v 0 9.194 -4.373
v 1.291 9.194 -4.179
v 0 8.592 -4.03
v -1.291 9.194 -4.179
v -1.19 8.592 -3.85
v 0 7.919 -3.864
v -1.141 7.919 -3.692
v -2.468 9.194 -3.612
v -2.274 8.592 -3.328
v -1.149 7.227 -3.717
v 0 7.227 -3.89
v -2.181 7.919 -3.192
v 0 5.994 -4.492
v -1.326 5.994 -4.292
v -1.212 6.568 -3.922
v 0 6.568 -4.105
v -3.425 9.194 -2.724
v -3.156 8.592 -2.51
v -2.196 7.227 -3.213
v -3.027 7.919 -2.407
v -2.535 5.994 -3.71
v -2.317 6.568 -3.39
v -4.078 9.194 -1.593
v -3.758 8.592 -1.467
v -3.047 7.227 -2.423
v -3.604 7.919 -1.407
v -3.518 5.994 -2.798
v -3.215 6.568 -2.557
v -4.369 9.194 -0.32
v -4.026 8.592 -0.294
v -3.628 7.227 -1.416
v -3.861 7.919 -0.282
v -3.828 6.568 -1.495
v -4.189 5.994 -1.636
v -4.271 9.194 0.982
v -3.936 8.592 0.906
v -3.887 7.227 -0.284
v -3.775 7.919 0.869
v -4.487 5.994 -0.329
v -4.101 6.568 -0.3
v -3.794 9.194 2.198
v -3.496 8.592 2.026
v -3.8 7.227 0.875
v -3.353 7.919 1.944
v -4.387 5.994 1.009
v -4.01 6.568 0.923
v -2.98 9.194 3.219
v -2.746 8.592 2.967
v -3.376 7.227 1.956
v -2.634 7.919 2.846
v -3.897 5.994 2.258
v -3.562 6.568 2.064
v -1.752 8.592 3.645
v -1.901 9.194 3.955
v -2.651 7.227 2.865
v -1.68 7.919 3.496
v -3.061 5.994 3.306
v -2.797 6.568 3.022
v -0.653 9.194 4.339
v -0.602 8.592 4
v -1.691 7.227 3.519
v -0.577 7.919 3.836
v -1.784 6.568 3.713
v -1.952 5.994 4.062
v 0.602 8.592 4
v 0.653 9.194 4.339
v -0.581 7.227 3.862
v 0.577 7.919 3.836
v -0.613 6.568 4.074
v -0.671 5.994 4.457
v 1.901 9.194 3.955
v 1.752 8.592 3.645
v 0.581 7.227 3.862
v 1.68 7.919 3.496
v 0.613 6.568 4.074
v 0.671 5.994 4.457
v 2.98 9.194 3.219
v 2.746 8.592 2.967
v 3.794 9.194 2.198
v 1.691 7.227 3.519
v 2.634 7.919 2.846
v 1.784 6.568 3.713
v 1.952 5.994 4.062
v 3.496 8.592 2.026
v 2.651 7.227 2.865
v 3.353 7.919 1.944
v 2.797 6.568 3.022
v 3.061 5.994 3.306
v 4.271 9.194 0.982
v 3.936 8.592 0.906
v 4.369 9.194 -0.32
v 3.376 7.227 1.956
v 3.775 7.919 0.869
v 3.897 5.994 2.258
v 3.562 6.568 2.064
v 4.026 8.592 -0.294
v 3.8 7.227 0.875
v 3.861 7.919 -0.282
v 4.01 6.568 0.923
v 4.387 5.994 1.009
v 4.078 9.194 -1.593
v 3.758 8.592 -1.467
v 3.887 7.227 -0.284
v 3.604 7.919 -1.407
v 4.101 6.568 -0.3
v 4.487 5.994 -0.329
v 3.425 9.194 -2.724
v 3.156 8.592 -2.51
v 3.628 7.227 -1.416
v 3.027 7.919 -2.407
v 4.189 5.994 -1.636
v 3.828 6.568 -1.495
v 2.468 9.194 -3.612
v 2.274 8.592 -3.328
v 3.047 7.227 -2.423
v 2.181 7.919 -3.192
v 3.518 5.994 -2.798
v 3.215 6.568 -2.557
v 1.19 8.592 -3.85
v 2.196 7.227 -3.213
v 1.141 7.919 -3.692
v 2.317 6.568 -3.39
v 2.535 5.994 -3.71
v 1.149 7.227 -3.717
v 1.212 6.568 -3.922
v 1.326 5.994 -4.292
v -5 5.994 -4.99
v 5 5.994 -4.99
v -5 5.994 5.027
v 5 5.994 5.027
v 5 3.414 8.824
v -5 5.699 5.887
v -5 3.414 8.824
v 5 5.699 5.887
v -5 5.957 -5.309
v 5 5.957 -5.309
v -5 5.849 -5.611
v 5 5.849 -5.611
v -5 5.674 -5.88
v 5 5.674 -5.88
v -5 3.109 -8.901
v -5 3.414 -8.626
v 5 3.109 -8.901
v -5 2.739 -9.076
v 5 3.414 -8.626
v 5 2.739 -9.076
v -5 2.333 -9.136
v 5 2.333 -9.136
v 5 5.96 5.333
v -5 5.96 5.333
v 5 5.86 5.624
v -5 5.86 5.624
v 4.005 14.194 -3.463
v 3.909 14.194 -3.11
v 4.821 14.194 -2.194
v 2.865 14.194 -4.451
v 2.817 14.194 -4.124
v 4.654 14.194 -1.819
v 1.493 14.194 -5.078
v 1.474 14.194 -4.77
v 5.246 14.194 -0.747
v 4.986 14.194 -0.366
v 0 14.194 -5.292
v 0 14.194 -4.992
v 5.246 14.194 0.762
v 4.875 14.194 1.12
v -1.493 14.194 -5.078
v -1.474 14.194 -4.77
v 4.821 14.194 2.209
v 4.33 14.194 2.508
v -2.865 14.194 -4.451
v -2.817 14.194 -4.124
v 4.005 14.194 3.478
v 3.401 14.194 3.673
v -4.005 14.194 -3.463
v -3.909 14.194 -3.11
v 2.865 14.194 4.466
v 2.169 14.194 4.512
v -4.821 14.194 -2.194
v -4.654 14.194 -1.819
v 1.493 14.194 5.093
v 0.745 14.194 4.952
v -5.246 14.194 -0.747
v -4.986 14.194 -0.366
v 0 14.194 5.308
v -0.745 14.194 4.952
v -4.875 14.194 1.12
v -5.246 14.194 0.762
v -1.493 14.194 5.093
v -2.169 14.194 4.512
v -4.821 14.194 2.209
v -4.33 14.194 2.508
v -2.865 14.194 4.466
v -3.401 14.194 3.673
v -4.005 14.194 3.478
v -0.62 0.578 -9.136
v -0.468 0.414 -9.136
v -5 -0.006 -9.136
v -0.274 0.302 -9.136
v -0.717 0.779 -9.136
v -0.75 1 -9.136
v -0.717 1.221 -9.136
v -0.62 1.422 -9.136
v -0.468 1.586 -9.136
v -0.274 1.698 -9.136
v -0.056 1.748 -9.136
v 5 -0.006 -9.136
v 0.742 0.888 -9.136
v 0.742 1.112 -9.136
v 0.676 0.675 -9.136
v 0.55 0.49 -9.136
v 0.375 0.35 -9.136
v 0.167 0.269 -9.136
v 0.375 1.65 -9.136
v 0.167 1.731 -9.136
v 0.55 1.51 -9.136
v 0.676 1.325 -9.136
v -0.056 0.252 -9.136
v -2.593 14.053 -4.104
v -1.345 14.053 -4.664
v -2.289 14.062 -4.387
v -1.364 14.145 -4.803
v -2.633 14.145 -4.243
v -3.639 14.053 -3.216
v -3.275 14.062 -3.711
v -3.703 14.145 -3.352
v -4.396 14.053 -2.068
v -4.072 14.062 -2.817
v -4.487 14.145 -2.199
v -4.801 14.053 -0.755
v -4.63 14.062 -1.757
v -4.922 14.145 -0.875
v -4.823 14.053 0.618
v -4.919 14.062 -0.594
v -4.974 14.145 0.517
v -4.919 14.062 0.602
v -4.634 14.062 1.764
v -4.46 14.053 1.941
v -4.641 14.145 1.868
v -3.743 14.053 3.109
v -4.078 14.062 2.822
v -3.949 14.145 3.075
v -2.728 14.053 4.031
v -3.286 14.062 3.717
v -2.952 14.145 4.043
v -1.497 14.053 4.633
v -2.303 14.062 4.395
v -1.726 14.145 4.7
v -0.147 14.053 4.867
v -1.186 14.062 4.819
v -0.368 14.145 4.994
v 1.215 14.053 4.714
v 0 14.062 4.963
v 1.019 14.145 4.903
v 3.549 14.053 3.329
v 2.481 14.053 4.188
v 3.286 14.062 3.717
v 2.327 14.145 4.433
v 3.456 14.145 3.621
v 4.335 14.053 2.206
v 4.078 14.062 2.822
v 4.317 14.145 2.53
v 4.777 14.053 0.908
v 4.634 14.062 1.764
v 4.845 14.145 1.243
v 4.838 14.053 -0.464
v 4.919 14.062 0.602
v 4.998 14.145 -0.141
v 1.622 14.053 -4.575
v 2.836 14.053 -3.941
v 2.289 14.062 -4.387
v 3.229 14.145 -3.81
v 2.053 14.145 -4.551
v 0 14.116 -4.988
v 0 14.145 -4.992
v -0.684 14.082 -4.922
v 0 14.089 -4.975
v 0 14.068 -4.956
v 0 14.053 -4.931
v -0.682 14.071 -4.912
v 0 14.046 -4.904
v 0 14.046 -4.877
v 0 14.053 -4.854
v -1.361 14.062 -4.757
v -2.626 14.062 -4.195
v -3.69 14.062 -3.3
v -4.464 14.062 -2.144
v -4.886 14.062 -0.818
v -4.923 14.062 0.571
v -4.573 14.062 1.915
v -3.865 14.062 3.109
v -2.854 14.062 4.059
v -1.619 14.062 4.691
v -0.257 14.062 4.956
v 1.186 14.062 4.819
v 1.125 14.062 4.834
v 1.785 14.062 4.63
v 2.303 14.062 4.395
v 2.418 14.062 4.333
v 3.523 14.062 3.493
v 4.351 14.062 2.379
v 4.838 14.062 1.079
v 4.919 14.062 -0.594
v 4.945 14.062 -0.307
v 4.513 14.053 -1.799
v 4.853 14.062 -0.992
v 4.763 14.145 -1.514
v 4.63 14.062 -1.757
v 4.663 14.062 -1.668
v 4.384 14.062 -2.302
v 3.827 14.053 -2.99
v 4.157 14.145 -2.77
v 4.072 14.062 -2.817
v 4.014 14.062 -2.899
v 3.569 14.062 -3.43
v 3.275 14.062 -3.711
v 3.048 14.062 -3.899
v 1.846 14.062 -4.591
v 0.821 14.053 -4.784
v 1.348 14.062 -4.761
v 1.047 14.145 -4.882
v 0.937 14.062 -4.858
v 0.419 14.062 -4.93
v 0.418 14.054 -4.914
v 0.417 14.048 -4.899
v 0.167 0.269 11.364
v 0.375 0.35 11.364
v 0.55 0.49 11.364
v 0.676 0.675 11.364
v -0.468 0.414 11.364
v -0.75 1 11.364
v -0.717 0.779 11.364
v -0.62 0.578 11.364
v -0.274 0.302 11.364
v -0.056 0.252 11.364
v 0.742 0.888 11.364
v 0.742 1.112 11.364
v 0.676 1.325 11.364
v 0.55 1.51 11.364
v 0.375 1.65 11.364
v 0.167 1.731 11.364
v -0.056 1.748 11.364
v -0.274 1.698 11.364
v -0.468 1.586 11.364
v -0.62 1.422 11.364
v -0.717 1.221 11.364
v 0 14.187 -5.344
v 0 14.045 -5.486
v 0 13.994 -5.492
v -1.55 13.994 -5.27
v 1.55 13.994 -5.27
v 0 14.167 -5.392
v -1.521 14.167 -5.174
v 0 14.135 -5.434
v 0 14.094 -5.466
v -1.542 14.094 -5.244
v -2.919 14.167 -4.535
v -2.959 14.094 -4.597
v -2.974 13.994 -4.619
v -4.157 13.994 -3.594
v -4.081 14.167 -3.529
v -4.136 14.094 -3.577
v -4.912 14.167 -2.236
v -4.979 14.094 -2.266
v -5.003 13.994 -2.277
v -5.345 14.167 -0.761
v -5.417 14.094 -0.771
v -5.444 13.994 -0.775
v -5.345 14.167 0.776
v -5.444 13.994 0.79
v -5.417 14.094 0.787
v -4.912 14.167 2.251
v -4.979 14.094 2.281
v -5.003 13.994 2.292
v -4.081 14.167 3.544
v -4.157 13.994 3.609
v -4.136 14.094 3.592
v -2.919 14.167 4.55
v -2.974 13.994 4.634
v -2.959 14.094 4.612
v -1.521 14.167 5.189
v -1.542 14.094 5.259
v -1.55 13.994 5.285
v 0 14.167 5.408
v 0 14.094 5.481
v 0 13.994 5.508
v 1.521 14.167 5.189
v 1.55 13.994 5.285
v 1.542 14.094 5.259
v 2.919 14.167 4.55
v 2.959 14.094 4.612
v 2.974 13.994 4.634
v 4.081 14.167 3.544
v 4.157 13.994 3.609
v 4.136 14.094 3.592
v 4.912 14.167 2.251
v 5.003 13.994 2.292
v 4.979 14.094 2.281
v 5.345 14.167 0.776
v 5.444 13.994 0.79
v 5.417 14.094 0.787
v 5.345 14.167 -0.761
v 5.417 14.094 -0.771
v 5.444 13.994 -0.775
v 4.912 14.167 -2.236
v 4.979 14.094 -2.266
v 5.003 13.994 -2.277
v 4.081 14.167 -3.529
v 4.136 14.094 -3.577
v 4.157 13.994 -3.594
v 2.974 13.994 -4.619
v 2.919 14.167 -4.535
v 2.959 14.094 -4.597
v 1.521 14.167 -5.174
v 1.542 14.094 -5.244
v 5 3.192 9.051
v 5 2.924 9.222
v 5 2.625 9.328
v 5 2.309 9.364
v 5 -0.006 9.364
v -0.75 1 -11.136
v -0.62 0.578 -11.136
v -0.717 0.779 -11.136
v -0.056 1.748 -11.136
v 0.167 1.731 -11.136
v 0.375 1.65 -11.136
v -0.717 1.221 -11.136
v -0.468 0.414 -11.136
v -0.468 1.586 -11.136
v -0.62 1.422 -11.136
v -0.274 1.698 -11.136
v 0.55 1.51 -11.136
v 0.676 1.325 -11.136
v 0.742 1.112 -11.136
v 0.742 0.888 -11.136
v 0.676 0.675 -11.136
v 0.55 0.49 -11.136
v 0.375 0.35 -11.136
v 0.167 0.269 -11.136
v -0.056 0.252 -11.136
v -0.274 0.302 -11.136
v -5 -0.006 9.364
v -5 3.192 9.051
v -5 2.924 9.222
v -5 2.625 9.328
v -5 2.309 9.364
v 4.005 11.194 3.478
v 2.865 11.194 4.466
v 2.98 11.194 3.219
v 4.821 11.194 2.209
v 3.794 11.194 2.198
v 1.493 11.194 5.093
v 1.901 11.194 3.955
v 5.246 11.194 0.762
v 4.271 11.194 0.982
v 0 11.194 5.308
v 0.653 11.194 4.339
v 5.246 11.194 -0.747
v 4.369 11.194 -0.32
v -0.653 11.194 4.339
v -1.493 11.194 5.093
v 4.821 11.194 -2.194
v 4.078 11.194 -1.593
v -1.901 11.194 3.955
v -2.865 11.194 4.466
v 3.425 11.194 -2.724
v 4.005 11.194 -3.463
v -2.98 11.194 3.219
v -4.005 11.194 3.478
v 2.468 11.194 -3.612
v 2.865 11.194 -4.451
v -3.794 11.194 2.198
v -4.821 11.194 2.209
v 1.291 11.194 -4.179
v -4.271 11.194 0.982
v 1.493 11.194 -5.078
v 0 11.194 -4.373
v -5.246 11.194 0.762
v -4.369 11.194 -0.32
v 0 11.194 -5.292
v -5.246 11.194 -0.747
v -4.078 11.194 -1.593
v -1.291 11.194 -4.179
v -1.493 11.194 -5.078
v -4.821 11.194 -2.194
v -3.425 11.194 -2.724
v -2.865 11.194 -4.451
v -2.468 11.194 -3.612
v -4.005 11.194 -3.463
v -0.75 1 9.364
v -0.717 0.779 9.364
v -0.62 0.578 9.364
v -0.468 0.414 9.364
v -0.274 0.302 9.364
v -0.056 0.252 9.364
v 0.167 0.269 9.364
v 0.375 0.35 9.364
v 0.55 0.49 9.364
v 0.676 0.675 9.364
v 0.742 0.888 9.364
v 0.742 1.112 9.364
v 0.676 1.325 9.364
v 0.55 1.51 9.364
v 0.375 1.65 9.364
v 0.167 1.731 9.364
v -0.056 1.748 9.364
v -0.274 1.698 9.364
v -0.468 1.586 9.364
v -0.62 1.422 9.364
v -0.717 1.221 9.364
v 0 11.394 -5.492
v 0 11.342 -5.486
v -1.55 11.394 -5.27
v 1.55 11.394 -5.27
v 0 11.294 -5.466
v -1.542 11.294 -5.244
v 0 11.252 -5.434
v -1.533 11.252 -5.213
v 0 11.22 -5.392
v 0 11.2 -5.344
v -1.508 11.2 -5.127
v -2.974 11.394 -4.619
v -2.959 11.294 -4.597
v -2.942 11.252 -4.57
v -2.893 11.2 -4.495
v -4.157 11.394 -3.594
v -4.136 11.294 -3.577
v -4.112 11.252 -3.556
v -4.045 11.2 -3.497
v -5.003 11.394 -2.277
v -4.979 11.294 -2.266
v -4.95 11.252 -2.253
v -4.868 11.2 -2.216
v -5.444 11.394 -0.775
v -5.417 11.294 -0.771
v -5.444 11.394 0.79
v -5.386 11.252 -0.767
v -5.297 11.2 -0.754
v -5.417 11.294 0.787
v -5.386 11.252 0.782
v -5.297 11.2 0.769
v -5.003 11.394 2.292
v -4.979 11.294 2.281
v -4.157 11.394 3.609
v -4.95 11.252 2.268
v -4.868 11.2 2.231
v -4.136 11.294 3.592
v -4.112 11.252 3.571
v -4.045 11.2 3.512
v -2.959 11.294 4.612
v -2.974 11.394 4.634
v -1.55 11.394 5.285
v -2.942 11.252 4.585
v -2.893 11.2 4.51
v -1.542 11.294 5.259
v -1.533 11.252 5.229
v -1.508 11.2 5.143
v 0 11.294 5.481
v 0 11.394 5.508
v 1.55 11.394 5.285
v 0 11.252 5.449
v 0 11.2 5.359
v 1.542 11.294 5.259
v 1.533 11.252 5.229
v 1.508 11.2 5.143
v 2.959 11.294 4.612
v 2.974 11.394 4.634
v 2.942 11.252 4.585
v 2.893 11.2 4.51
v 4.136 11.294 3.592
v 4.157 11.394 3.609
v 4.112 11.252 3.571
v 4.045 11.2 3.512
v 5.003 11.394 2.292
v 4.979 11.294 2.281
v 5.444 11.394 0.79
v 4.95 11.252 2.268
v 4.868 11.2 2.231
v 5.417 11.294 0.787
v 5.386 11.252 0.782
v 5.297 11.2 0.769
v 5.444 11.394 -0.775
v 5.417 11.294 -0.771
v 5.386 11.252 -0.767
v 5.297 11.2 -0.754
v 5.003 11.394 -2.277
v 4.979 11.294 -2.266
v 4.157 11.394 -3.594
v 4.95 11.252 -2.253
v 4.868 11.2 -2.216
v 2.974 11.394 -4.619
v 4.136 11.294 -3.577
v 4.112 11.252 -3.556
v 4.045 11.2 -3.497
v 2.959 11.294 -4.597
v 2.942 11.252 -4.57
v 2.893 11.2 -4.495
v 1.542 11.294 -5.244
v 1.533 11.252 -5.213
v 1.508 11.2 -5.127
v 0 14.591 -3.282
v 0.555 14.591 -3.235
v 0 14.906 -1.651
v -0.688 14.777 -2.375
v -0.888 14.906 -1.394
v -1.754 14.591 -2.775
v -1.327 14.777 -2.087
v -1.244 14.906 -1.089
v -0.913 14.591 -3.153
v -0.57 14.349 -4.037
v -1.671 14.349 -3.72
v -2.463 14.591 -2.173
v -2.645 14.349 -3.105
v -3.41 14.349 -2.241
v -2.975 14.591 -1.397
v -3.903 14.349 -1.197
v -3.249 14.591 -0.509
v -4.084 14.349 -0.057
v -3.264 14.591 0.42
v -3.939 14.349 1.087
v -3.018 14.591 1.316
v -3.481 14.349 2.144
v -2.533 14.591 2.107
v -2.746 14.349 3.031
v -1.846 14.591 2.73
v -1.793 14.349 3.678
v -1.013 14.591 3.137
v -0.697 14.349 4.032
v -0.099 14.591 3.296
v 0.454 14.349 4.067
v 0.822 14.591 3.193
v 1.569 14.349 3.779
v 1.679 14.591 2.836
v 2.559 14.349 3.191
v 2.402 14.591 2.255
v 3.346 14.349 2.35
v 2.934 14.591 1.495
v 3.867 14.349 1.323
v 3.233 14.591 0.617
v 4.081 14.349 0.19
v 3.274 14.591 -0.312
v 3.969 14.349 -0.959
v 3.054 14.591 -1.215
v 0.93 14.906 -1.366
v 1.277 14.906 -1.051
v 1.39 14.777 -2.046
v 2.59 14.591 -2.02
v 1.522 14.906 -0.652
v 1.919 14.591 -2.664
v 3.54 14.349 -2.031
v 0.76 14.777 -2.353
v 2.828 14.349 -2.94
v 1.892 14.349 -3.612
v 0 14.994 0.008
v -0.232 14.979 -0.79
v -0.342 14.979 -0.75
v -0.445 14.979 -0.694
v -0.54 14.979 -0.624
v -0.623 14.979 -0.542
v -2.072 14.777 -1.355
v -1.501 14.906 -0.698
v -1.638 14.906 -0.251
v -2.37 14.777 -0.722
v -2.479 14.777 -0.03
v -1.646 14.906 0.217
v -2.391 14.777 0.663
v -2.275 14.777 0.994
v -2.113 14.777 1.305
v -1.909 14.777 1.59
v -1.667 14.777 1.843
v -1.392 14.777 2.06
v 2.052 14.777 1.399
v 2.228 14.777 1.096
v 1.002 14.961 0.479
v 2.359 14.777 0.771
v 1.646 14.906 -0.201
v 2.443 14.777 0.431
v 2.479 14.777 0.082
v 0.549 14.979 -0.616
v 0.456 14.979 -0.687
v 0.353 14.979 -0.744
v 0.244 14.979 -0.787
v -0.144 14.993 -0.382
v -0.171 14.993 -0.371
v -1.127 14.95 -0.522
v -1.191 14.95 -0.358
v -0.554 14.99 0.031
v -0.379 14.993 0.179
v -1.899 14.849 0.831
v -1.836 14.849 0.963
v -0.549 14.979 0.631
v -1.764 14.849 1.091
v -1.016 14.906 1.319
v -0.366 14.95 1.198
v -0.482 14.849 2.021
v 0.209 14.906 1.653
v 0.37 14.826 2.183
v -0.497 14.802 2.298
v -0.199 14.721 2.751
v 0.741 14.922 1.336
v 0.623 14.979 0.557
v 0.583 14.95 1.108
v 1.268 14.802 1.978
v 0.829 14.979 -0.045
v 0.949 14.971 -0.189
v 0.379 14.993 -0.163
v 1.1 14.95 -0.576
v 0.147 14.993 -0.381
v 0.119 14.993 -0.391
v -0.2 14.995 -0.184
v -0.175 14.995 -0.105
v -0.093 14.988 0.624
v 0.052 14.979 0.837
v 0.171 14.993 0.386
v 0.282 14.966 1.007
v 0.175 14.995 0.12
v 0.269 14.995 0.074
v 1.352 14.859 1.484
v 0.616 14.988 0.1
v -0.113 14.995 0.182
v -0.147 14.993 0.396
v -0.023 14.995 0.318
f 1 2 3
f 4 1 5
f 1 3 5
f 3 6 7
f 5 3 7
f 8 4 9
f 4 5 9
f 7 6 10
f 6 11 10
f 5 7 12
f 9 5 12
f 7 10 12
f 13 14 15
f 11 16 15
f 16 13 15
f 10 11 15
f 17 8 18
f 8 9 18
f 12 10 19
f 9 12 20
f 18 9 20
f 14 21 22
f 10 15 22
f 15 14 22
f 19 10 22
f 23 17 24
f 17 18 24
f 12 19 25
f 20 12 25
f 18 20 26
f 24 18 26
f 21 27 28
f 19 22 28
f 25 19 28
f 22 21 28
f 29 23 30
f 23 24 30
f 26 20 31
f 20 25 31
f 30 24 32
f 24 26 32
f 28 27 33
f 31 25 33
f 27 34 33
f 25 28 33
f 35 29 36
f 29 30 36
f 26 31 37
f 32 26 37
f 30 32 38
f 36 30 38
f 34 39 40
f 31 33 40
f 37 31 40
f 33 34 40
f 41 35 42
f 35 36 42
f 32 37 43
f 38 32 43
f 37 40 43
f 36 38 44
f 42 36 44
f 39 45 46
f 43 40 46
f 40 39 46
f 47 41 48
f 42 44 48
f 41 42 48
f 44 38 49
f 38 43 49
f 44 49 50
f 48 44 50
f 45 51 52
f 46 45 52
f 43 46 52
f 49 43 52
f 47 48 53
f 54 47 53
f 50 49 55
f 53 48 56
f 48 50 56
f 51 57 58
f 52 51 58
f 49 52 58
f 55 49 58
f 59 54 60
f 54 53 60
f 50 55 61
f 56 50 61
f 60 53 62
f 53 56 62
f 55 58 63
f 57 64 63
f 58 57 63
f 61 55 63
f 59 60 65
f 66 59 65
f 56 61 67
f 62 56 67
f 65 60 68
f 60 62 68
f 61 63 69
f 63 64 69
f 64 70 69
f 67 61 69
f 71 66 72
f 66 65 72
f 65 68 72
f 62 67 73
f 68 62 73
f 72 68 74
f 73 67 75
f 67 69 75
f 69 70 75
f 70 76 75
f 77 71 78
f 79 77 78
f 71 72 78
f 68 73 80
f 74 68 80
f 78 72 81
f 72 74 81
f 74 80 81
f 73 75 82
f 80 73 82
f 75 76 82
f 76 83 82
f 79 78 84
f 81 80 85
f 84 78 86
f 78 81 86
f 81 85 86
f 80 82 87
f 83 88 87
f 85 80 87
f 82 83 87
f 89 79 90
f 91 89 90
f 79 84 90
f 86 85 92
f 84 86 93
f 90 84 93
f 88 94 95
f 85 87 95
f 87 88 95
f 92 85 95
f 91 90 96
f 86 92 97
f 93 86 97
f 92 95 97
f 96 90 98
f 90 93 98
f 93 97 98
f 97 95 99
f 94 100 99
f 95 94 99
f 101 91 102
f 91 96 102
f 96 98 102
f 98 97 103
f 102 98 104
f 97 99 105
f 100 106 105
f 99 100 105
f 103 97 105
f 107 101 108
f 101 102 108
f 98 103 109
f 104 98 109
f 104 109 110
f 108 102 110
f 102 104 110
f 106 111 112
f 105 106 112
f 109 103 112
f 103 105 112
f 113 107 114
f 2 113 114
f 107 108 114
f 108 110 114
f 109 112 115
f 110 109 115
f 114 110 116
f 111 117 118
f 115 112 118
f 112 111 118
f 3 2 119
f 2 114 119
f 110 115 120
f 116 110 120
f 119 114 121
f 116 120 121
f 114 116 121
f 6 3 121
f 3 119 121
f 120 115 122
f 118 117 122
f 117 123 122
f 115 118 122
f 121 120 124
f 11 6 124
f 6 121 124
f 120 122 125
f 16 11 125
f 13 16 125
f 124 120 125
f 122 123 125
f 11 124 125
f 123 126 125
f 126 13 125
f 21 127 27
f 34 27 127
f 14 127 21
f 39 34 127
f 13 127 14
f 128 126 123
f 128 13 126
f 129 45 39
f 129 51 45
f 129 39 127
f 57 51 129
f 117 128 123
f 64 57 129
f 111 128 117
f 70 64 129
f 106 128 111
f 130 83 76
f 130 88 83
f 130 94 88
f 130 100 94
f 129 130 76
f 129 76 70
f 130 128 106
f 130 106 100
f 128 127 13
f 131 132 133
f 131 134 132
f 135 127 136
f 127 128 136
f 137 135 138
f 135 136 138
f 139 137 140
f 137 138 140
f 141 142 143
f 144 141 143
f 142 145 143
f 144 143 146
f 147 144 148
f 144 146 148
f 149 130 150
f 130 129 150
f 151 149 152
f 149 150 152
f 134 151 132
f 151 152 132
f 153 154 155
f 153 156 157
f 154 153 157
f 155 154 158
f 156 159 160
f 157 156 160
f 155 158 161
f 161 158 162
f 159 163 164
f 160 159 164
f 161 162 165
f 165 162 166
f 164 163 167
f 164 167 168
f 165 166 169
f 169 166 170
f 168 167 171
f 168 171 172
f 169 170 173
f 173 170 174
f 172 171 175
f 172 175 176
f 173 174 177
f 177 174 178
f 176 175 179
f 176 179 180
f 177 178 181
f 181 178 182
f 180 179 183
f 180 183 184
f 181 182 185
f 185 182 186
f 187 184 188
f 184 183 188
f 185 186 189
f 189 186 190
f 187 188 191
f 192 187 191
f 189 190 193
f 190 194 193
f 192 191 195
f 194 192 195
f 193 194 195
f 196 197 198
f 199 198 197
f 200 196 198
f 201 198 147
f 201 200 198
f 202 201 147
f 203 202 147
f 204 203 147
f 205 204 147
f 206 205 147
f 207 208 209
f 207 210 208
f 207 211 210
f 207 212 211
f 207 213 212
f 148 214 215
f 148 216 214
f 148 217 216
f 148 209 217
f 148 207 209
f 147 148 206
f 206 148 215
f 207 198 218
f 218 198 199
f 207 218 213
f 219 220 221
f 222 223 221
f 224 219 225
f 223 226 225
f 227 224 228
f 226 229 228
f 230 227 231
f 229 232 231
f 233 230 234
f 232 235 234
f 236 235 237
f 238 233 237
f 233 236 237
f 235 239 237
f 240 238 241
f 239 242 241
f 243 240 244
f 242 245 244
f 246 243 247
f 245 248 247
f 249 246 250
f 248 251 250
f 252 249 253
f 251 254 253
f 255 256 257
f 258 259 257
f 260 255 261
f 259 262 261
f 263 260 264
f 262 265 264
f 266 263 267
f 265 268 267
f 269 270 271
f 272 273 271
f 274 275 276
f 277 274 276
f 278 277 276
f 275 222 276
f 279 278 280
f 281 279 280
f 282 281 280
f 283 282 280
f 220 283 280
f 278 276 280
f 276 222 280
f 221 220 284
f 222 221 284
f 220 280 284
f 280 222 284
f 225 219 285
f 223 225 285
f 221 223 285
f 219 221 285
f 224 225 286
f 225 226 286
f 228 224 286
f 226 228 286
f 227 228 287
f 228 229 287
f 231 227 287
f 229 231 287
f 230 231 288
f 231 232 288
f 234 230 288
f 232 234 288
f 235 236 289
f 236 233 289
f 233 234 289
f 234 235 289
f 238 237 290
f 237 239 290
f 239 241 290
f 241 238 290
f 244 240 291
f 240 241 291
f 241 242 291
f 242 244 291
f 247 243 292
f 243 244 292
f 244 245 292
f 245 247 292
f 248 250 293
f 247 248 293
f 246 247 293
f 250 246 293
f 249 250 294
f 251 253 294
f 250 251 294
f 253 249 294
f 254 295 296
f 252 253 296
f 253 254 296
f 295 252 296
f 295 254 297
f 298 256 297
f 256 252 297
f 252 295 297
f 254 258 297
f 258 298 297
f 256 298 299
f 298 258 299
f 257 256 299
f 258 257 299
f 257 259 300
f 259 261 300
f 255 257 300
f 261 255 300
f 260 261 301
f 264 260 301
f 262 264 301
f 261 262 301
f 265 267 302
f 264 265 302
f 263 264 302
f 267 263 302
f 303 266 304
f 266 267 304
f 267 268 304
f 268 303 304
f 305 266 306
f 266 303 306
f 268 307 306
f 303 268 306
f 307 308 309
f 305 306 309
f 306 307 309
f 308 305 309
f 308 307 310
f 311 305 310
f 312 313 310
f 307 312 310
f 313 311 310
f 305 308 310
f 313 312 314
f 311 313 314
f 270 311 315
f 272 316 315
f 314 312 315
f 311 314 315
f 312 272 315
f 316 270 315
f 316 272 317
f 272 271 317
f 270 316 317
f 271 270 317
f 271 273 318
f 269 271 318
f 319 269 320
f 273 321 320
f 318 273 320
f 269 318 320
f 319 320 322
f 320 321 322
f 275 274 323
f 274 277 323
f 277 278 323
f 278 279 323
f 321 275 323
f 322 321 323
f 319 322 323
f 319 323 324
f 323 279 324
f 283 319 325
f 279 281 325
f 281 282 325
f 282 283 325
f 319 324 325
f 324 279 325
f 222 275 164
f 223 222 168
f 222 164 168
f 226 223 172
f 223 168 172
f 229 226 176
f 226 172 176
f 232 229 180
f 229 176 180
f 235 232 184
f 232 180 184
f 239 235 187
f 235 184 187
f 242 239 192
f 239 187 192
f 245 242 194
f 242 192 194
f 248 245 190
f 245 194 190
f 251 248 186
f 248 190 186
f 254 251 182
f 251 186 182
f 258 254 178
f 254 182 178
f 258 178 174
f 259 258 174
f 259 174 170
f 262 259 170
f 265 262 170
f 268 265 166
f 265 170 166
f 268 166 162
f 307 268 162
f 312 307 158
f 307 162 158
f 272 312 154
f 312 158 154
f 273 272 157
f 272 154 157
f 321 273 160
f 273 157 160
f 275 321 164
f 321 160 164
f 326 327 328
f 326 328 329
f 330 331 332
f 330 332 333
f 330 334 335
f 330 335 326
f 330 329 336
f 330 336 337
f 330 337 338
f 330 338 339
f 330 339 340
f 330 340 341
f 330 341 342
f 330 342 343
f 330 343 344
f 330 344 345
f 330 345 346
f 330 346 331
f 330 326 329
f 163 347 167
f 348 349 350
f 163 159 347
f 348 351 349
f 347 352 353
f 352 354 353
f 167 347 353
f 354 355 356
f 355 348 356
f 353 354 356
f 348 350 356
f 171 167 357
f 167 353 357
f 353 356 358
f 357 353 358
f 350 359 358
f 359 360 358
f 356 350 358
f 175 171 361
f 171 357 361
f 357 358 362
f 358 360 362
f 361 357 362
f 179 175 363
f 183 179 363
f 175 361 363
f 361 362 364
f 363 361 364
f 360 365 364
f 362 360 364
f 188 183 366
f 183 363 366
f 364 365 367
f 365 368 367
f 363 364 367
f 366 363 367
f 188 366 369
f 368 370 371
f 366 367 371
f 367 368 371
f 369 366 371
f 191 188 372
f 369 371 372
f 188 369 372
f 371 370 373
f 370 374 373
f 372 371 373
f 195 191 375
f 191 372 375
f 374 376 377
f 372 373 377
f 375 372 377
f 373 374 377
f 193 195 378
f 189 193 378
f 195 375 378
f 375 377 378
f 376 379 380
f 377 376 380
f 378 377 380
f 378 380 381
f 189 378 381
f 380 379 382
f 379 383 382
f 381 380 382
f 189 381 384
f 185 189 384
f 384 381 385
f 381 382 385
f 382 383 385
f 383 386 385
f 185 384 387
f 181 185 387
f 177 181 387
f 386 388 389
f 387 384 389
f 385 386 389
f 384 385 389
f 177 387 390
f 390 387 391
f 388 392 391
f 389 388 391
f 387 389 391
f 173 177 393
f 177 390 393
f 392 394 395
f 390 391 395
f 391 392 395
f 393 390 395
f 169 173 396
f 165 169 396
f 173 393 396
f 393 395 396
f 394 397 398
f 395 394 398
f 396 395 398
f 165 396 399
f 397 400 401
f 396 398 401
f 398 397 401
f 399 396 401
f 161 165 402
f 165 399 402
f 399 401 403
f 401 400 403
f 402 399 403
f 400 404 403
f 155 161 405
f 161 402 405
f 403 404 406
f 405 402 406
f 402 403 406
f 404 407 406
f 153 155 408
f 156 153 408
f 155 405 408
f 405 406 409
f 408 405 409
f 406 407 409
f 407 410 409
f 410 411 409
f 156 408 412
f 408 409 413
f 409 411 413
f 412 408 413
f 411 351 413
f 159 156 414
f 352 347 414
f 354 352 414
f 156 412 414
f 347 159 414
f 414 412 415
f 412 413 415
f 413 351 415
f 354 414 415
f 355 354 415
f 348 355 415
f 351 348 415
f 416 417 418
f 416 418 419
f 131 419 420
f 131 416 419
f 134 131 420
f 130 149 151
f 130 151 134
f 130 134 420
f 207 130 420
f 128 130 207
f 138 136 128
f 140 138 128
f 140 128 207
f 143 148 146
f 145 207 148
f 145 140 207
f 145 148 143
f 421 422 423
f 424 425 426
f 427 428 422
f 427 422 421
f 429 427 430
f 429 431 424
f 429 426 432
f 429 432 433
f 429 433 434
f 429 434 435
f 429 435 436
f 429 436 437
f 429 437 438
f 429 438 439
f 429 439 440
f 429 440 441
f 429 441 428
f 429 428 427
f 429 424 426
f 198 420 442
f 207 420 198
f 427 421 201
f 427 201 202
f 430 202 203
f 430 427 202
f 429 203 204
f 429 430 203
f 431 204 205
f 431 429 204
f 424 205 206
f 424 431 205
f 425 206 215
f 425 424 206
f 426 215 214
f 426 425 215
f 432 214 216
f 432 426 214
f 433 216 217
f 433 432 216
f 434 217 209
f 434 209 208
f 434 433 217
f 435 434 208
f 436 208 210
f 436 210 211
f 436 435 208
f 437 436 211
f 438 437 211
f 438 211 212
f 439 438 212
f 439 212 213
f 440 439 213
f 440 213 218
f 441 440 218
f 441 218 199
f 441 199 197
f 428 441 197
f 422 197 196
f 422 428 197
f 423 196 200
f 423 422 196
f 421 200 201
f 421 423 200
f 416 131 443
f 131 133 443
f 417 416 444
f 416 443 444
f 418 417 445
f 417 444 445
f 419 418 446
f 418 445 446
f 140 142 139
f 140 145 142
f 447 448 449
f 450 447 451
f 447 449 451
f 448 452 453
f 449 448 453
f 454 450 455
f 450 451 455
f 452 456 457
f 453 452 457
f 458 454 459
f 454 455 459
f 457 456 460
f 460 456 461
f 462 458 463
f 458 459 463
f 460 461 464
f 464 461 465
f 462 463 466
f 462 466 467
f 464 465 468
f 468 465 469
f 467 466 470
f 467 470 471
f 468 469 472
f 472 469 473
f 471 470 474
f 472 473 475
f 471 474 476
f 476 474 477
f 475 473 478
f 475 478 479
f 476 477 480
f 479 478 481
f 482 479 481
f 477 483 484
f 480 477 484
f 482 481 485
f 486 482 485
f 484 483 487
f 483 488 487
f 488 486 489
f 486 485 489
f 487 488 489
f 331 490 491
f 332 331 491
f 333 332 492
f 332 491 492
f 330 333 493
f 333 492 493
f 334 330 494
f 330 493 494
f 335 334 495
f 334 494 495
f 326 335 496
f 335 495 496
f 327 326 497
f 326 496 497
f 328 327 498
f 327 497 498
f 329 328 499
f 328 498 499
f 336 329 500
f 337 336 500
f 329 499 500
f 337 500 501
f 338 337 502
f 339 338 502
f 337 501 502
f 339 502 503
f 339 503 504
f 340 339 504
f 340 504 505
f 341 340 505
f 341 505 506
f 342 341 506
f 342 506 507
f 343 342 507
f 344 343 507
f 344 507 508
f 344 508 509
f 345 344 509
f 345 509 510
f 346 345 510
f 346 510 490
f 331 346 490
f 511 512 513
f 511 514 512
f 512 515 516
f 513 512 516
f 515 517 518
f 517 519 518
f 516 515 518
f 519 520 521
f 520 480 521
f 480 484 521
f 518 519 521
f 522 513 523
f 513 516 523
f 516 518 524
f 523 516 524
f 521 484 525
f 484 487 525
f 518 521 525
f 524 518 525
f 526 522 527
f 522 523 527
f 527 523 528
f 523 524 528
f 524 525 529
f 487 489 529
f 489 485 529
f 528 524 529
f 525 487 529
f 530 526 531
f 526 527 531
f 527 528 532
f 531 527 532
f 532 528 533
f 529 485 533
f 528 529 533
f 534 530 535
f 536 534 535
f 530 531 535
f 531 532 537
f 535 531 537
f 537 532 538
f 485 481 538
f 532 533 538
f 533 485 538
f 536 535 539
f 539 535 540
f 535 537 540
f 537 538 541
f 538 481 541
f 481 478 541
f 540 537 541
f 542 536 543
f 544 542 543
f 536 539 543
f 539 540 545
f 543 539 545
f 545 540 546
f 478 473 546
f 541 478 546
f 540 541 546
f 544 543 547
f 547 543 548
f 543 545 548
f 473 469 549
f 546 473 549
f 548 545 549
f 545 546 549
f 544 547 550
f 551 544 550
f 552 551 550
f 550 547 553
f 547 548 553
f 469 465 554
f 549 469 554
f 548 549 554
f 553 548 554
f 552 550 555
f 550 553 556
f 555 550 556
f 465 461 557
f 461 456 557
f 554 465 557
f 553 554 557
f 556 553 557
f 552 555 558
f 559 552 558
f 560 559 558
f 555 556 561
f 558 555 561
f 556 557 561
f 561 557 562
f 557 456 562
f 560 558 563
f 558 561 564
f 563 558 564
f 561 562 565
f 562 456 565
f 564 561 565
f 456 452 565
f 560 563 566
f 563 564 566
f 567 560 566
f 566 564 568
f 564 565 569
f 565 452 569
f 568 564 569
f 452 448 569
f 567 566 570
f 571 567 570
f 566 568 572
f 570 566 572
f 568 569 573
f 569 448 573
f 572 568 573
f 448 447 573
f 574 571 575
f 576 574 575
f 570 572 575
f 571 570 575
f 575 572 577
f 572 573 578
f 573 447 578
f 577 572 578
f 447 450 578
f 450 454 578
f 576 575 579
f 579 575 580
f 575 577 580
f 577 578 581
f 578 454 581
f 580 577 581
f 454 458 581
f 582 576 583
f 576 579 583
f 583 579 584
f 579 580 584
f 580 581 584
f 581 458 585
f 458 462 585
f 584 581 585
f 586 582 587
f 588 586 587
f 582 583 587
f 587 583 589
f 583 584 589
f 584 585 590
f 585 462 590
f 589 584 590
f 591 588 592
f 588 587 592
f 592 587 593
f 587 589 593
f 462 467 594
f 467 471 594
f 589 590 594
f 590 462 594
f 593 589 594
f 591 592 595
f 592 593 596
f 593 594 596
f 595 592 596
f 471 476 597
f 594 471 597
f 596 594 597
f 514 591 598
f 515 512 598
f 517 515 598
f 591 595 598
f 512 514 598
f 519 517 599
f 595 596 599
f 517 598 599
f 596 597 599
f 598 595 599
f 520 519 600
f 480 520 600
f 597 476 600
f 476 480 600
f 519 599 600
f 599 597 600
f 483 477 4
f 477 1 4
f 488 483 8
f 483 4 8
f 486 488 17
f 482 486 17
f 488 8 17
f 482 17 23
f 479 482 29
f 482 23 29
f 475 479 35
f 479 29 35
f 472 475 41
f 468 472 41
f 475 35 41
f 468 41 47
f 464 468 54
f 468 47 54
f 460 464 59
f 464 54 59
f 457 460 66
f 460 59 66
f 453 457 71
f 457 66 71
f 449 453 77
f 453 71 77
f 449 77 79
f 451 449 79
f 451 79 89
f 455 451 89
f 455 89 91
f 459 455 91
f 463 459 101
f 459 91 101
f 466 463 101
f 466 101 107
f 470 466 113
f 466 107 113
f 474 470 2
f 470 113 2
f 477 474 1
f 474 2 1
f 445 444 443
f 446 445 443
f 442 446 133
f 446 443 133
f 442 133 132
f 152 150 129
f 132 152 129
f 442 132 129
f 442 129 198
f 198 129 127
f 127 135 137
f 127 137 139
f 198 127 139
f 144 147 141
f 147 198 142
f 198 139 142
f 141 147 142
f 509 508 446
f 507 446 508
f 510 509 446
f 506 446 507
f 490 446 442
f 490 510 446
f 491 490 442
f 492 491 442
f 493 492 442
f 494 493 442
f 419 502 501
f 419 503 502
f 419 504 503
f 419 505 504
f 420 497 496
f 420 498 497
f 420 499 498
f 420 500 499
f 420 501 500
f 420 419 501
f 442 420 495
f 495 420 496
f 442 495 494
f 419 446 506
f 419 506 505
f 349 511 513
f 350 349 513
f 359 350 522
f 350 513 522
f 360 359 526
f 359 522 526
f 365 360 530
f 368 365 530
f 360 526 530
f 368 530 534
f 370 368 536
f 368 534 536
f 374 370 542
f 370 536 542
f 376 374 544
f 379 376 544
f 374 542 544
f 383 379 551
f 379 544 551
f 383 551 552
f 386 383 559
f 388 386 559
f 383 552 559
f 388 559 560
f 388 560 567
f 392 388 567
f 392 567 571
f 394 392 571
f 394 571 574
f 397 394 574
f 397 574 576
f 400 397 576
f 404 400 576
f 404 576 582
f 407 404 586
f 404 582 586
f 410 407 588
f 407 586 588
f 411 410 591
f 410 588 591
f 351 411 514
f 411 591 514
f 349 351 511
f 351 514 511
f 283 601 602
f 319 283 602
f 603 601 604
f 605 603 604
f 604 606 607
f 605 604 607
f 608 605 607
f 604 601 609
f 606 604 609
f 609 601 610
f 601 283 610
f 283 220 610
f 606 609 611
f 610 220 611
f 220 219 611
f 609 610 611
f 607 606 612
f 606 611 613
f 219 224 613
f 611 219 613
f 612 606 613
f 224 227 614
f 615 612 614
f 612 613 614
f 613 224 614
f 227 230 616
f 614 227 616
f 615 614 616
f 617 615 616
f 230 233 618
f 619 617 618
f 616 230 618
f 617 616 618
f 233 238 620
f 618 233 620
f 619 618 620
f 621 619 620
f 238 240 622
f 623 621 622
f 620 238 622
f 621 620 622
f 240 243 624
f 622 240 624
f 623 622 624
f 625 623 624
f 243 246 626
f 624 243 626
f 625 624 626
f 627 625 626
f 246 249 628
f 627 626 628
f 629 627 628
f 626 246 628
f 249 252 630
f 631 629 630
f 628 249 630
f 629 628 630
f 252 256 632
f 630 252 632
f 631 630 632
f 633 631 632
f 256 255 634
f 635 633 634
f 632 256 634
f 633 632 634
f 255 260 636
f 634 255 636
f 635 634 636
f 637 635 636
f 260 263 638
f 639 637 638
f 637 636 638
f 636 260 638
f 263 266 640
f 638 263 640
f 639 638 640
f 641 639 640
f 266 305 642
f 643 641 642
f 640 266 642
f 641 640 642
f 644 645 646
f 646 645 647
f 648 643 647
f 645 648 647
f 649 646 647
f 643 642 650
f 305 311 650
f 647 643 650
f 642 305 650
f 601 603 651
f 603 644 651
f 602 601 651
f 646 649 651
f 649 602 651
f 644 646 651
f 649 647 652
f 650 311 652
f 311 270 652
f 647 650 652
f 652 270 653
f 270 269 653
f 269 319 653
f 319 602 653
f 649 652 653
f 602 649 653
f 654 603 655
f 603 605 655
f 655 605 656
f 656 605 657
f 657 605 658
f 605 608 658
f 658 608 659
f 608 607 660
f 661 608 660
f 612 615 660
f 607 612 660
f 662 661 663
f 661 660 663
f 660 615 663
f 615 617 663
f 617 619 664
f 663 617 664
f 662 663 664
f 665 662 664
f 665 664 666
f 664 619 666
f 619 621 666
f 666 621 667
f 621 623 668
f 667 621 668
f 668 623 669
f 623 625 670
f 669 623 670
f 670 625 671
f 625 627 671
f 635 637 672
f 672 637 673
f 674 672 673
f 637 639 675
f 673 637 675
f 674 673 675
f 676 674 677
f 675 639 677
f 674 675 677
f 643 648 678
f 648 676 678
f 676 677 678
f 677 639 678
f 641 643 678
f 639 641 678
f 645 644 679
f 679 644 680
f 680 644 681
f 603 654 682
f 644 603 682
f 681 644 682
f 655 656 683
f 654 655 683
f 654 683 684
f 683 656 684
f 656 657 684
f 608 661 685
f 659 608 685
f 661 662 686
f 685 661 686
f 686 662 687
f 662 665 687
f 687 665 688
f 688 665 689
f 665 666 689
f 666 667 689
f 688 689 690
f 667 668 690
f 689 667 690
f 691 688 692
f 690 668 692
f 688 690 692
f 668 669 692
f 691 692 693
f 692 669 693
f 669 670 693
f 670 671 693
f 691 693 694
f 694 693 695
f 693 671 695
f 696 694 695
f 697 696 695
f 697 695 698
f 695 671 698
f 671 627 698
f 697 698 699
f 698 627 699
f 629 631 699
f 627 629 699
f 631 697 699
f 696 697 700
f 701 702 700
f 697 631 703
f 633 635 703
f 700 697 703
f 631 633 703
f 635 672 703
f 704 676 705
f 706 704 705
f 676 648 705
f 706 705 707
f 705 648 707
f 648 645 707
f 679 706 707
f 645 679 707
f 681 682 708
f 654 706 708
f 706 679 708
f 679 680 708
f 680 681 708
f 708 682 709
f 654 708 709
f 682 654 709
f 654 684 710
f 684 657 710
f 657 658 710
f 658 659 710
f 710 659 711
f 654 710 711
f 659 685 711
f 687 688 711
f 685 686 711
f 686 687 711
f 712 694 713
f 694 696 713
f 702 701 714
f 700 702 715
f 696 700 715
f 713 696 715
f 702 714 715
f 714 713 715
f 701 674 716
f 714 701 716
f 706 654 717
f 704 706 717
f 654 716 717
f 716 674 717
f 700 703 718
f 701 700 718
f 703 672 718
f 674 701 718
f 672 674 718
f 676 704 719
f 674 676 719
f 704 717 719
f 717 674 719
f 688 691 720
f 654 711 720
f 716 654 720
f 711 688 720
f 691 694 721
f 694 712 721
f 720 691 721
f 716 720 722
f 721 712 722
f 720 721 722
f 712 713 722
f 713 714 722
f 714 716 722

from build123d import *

# Parameters (mm, degrees)
BOSS_EXTRUDE1_DEPTH = 5
FILLET2_R           = 0.2
FILLET3_R           = 0.1
FILLET4_R           = 1.4
SKETCH5_R           = 0.75
BOSS_EXTRUDE2_DEPTH = 2
BOSS_EXTRUDE3_START = 2
SKETCH6_R           = 0.75
BOSS_EXTRUDE3_DEPTH = 2


with BuildPart() as part:
    # Sketch1 → Boss-Extrude1 (new, symmetric)
    with BuildSketch(Plane(origin=(0, 0, 0), x_dir=(0, 0, -1), z_dir=(1, 0, 0))):
        Polygon((-9.364235946, -0.006373265), (9.135764054, -0.006373265), (9.135764054, 2.993626735), (5.492417081, 5.993626735), (-5.507582919, 5.993626735), (-9.364235946, 2.993626735), align=None)
    extrude(amount=BOSS_EXTRUDE1_DEPTH, both=True)

    # Sketch3 → Revolve1 (revolve)
    with BuildSketch(Plane(origin=(0, 0, 0), x_dir=(0, 0, -1), z_dir=(1, 0, 0)), mode=Mode.PRIVATE) as revolve1_sk:
        with BuildLine():
            Line((-0.007582919, 5.993626735), (-0.007582919, 13.993626735))
            Line((-0.007582919, 13.993626735), (-5.007582919, 13.993626735))
            Line((-5.007582919, 13.993626735), (-5.007582919, 14.193626735))
            Line((-5.007582919, 14.193626735), (-5.507582919, 14.193626735))
            Line((-5.507582919, 14.193626735), (-5.507582919, 11.193626735))
            Line((-5.507582919, 11.193626735), (-4.388427411, 11.193626735))
            Line((-4.388427411, 11.193626735), (-4.388427411, 9.193626735))
            ThreePointArc((-4.388427411, 9.193626735), (-3.86841998, 7.572045246), (-4.507582919, 5.993626735))
            Line((-4.507582919, 5.993626735), (-0.007582919, 5.993626735))
        make_face()
    revolve(revolve1_sk.sketch.rotate(Axis((0, 5.993626735, 0.007582919), (0, 1, 0)), 180), axis=Axis((0, 5.993626735, 0.007582919), (0, 1, 0)))

    # Sketch4 → Revolve2 (revolve)
    with BuildSketch(Plane(origin=(0, 0, 0), x_dir=(0, 0, -1), z_dir=(1, 0, 0))):
        with BuildLine():
            Line((-0.007582919, 14.193626735), (-0.007582919, 14.993626735))
            ThreePointArc((-0.007582919, 14.993626735), (2.546145175, 14.762267206), (4.992417081, 13.993626735))
            Line((4.992417081, 13.993626735), (-0.007582919, 13.993626735))
            Line((-0.007582919, 13.993626735), (-0.007582919, 14.193626735))
        make_face()
    revolve(axis=Axis((0, 14.193626735, 0.007582919), (0, 1, 0)))

    # Fillet2
    fillet2_edges = [part.edges().sort_by_distance(p)[0] for p in [
        (0, 11.193626735, 5.507582919),
        (0, 14.193626735, 5.507582919),
    ]]
    fillet(fillet2_edges, radius=FILLET2_R)

    # Fillet3
    fillet3_edges = [part.edges().sort_by_distance(p)[0] for p in [
        (0, 13.993626735, 5.007582919),
    ]]
    fillet(fillet3_edges, radius=FILLET3_R)

    # Fillet4
    fillet4_edges = [part.edges().sort_by_distance(p)[0] for p in [
        (0, 5.993626735, -5.492417081),
        (0, 2.993626735, -9.135764054),
        (0, 2.993626735, 9.364235946),
        (0, 5.993626735, 5.507582919),
    ]]
    fillet(fillet4_edges, radius=FILLET4_R)

    # Sketch5 → Boss-Extrude2 (add)
    with BuildSketch(Plane.XY.offset(9.364235946)):
        with Locations(Location((0, 1, 0), (0, 0, 180))):
            Circle(SKETCH5_R)
    extrude(amount=BOSS_EXTRUDE2_DEPTH)

    # Sketch6 → Boss-Extrude3 (add)
    with BuildSketch(Plane(origin=(0, 0, -9.135764054), x_dir=(-1, 0, 0), z_dir=(0, 0, -1)).offset(BOSS_EXTRUDE3_START)):
        with Locations((0, 1)):
            Circle(SKETCH6_R)
    boss_extrude3 = extrude(amount=-BOSS_EXTRUDE3_DEPTH)

    # Mirror4: Boss-Extrude3 across plane
    add(boss_extrude3.mirror(Plane.XY))


solid = part.part
